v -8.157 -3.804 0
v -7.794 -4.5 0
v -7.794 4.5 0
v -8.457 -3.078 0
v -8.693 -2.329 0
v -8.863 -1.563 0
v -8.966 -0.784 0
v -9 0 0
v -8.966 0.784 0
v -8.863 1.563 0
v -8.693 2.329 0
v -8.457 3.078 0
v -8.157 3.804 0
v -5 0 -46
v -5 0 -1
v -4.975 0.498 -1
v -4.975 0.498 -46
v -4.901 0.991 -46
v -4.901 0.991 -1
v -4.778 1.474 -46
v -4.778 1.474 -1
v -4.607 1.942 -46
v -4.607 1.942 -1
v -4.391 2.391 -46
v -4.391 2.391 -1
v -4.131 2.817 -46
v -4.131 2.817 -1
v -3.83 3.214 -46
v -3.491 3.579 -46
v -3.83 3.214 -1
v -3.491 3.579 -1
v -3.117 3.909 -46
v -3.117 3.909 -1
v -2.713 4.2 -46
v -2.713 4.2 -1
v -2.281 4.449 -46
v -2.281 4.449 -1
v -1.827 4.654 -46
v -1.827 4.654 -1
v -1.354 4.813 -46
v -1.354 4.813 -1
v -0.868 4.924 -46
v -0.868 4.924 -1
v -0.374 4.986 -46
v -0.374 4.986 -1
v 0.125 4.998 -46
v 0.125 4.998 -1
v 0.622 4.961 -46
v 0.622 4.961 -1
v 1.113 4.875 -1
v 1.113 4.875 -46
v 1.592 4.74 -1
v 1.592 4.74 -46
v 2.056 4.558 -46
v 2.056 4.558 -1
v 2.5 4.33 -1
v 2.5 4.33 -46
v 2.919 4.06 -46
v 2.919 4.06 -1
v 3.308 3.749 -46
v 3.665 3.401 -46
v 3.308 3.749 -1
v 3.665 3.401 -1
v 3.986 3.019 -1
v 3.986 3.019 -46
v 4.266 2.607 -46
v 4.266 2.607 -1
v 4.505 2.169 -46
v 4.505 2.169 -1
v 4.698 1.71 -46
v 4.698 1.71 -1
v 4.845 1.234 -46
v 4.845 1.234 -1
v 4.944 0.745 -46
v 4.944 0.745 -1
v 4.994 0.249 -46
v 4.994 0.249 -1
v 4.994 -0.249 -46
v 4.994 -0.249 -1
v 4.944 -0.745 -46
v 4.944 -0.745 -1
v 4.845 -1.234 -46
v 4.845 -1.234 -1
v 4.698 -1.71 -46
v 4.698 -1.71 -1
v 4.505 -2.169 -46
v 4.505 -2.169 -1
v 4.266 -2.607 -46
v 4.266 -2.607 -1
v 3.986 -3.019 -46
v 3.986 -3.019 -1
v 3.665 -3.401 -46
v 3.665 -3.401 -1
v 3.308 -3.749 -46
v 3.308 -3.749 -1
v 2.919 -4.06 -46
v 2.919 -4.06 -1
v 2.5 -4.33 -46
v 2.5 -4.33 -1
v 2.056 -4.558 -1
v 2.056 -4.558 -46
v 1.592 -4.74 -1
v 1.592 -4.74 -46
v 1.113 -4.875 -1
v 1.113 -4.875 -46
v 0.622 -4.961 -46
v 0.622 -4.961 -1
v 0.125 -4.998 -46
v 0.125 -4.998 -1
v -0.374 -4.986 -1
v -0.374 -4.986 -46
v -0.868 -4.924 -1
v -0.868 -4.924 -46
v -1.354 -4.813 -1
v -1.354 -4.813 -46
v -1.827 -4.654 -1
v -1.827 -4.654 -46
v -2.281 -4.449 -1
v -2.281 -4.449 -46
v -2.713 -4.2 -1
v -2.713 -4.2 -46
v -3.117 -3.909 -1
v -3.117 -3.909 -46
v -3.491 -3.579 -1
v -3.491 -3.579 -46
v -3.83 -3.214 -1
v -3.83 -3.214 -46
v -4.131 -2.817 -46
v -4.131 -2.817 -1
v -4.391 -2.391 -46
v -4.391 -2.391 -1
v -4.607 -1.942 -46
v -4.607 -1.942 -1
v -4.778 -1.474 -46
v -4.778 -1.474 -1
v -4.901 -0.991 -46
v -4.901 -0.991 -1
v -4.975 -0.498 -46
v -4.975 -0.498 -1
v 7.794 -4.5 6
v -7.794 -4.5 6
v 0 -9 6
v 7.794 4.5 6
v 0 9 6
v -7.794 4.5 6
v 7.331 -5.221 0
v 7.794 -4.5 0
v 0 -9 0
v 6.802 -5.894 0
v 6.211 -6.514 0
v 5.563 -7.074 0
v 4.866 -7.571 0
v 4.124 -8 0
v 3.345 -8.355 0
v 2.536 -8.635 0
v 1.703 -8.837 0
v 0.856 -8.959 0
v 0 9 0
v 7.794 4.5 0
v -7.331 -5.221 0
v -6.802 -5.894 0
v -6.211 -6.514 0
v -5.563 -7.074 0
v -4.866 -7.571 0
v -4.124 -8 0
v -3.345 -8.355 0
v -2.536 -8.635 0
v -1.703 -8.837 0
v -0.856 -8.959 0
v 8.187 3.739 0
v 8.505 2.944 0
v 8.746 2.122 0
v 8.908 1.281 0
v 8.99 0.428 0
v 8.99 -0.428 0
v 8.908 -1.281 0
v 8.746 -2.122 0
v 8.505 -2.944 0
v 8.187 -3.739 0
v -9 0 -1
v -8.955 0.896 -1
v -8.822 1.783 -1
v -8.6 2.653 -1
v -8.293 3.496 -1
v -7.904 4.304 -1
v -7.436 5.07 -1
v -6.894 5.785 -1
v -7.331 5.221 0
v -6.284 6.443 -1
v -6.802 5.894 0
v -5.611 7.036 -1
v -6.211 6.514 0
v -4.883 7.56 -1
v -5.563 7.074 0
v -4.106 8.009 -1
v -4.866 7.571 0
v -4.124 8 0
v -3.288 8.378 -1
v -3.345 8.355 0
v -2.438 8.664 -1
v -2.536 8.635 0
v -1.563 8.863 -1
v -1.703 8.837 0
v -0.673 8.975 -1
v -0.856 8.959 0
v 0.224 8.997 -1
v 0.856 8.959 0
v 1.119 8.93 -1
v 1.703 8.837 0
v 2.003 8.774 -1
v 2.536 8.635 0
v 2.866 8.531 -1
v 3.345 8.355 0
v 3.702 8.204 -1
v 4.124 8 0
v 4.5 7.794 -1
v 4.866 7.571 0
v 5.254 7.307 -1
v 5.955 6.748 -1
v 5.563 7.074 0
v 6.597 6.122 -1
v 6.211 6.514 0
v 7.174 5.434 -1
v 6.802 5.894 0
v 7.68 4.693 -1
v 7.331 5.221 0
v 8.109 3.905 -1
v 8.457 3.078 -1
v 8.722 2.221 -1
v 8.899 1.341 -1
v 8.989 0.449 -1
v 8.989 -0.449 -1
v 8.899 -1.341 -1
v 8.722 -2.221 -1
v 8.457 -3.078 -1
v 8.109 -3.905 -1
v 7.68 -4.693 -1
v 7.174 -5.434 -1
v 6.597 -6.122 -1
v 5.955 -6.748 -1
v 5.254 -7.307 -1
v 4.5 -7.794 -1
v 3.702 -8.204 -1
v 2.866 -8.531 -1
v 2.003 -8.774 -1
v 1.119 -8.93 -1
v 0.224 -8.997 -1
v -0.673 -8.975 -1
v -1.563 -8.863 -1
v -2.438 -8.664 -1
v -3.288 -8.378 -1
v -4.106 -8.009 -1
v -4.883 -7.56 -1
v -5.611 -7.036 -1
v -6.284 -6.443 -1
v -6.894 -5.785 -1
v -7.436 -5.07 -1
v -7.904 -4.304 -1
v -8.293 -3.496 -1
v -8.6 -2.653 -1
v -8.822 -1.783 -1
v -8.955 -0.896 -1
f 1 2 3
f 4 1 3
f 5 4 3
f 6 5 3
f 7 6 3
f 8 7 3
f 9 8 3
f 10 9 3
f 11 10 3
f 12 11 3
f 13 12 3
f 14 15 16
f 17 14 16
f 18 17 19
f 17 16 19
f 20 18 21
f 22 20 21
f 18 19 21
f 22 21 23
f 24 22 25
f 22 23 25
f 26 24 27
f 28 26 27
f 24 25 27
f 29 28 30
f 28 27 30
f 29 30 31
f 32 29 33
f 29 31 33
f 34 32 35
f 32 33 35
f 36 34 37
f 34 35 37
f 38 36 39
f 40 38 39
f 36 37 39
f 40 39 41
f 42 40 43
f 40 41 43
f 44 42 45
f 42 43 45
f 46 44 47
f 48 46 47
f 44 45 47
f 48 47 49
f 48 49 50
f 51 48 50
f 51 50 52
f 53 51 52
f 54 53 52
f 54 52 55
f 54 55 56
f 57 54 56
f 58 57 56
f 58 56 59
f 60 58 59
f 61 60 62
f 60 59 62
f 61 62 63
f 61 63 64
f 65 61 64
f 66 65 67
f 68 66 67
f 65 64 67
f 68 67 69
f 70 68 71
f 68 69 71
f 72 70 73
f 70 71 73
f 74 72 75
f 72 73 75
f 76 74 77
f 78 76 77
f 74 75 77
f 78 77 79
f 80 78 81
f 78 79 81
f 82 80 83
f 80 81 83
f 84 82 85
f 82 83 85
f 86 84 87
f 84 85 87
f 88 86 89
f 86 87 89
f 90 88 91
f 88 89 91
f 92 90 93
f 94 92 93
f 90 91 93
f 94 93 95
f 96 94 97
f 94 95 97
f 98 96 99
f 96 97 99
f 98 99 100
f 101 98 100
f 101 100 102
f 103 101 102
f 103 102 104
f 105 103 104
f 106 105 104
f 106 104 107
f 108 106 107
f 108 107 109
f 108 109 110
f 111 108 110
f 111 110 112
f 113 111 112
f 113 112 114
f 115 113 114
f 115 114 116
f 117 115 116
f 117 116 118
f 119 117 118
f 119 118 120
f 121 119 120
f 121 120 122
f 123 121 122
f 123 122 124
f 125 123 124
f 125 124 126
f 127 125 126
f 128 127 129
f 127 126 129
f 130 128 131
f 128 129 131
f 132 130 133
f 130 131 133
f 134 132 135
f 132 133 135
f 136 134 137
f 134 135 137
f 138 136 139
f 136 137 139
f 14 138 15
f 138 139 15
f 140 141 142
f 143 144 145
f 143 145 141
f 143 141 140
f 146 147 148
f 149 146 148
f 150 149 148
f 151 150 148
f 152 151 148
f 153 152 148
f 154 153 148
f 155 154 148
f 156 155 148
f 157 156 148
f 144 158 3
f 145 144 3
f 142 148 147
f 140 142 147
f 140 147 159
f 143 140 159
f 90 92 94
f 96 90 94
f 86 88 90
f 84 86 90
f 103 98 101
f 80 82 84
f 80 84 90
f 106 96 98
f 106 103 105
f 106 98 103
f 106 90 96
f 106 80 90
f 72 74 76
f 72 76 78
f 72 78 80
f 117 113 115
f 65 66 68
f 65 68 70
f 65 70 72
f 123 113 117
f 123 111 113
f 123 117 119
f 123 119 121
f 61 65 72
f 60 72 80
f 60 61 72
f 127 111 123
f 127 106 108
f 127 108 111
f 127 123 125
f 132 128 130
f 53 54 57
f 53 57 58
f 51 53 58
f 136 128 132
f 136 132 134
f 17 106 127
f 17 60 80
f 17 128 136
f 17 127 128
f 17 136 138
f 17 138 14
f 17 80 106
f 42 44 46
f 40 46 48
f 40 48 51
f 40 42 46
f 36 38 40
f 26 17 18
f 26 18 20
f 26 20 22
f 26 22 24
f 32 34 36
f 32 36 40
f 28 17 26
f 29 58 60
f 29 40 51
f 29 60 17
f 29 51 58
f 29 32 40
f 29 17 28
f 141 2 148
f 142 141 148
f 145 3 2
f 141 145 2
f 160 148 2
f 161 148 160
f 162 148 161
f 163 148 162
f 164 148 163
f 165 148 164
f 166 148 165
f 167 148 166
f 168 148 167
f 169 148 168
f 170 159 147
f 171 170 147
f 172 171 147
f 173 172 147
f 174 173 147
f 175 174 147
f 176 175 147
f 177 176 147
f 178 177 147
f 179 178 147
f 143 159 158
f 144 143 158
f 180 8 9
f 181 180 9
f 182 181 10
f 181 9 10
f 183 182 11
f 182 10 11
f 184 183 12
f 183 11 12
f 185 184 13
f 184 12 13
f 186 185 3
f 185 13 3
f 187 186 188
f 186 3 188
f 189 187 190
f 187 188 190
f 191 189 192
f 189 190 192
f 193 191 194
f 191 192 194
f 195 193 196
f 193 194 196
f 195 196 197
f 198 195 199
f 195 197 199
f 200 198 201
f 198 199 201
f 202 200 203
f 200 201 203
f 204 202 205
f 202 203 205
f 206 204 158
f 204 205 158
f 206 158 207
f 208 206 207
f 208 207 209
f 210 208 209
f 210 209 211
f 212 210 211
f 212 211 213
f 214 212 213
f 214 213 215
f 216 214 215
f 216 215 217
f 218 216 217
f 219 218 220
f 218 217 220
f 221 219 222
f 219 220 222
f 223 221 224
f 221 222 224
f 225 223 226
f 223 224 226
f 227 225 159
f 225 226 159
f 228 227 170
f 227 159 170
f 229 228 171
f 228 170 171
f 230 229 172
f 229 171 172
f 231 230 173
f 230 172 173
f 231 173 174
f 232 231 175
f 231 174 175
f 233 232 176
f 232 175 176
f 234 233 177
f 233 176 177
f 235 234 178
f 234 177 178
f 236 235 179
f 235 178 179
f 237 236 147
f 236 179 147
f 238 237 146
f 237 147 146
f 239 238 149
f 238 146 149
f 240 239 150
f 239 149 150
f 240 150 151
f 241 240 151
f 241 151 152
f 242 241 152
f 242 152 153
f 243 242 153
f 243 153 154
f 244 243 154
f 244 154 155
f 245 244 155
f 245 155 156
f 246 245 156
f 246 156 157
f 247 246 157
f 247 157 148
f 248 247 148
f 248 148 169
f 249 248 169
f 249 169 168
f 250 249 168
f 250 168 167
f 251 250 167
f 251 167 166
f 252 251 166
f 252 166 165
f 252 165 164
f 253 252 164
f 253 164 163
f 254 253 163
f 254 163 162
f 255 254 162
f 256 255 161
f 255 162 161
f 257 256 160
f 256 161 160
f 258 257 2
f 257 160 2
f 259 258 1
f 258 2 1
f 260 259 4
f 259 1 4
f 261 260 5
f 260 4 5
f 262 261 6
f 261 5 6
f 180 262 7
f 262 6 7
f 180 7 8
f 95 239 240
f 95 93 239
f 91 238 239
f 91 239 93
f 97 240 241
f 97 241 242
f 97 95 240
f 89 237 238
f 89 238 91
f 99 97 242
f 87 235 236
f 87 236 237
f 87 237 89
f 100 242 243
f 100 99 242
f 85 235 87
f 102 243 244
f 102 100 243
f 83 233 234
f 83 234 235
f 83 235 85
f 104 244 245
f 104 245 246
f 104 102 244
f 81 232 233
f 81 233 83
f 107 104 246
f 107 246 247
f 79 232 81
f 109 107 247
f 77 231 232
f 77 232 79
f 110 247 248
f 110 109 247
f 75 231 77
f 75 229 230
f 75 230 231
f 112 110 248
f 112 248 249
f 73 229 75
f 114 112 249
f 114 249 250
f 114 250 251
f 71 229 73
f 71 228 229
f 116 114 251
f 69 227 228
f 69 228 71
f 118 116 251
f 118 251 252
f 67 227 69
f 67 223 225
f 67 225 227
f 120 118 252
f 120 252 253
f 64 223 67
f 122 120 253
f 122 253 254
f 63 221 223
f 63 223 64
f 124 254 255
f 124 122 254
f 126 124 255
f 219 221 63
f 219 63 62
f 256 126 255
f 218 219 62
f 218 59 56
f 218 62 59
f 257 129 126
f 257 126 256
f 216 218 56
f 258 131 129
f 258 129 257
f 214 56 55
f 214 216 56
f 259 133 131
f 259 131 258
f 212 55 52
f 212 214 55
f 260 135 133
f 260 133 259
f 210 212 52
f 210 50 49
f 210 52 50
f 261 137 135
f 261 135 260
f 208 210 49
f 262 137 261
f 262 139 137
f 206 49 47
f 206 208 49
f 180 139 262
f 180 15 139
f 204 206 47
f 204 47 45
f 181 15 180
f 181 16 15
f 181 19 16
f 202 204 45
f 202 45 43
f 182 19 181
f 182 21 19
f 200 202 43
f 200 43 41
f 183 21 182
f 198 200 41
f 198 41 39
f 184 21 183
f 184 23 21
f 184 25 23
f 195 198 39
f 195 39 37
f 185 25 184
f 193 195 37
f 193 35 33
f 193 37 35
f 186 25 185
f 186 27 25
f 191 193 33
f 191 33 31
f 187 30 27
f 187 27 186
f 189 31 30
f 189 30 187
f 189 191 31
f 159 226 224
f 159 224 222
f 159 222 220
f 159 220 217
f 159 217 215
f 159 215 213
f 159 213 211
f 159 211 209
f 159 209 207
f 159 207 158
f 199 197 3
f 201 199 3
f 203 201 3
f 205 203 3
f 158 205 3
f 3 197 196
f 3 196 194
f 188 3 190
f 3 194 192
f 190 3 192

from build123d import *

# Parameters (mm, degrees)
BOSS_EXTRUDE1_DEPTH = 6
SKETCH2_R           = 9
BOSS_EXTRUDE2_DEPTH = 1
SKETCH3_R           = 5
BOSS_EXTRUDE3_DEPTH = 45


with BuildPart() as part:
    # Sketch1 → Boss-Extrude1 (new body)
    with BuildSketch(Plane.XY):
        Polygon((0, 9), (-7.794228634, 4.5), (-7.794228634, -4.5), (0, -9), (7.794228634, -4.5), (7.794228634, 4.5), align=None)
    extrude(amount=BOSS_EXTRUDE1_DEPTH)

    # Sketch2 → Boss-Extrude2 (add)
    with BuildSketch(Plane(origin=(0, 0, 0), x_dir=(-1, 0, 0), z_dir=(0, 0, -1))):
        Circle(SKETCH2_R)
    extrude(amount=BOSS_EXTRUDE2_DEPTH)

    # Sketch3 → Boss-Extrude3 (add)
    with BuildSketch(Plane(origin=(0, 0, -1), x_dir=(-1, 0, 0), z_dir=(0, 0, -1))):
        Circle(SKETCH3_R)
    extrude(amount=BOSS_EXTRUDE3_DEPTH)


solid = part.part
